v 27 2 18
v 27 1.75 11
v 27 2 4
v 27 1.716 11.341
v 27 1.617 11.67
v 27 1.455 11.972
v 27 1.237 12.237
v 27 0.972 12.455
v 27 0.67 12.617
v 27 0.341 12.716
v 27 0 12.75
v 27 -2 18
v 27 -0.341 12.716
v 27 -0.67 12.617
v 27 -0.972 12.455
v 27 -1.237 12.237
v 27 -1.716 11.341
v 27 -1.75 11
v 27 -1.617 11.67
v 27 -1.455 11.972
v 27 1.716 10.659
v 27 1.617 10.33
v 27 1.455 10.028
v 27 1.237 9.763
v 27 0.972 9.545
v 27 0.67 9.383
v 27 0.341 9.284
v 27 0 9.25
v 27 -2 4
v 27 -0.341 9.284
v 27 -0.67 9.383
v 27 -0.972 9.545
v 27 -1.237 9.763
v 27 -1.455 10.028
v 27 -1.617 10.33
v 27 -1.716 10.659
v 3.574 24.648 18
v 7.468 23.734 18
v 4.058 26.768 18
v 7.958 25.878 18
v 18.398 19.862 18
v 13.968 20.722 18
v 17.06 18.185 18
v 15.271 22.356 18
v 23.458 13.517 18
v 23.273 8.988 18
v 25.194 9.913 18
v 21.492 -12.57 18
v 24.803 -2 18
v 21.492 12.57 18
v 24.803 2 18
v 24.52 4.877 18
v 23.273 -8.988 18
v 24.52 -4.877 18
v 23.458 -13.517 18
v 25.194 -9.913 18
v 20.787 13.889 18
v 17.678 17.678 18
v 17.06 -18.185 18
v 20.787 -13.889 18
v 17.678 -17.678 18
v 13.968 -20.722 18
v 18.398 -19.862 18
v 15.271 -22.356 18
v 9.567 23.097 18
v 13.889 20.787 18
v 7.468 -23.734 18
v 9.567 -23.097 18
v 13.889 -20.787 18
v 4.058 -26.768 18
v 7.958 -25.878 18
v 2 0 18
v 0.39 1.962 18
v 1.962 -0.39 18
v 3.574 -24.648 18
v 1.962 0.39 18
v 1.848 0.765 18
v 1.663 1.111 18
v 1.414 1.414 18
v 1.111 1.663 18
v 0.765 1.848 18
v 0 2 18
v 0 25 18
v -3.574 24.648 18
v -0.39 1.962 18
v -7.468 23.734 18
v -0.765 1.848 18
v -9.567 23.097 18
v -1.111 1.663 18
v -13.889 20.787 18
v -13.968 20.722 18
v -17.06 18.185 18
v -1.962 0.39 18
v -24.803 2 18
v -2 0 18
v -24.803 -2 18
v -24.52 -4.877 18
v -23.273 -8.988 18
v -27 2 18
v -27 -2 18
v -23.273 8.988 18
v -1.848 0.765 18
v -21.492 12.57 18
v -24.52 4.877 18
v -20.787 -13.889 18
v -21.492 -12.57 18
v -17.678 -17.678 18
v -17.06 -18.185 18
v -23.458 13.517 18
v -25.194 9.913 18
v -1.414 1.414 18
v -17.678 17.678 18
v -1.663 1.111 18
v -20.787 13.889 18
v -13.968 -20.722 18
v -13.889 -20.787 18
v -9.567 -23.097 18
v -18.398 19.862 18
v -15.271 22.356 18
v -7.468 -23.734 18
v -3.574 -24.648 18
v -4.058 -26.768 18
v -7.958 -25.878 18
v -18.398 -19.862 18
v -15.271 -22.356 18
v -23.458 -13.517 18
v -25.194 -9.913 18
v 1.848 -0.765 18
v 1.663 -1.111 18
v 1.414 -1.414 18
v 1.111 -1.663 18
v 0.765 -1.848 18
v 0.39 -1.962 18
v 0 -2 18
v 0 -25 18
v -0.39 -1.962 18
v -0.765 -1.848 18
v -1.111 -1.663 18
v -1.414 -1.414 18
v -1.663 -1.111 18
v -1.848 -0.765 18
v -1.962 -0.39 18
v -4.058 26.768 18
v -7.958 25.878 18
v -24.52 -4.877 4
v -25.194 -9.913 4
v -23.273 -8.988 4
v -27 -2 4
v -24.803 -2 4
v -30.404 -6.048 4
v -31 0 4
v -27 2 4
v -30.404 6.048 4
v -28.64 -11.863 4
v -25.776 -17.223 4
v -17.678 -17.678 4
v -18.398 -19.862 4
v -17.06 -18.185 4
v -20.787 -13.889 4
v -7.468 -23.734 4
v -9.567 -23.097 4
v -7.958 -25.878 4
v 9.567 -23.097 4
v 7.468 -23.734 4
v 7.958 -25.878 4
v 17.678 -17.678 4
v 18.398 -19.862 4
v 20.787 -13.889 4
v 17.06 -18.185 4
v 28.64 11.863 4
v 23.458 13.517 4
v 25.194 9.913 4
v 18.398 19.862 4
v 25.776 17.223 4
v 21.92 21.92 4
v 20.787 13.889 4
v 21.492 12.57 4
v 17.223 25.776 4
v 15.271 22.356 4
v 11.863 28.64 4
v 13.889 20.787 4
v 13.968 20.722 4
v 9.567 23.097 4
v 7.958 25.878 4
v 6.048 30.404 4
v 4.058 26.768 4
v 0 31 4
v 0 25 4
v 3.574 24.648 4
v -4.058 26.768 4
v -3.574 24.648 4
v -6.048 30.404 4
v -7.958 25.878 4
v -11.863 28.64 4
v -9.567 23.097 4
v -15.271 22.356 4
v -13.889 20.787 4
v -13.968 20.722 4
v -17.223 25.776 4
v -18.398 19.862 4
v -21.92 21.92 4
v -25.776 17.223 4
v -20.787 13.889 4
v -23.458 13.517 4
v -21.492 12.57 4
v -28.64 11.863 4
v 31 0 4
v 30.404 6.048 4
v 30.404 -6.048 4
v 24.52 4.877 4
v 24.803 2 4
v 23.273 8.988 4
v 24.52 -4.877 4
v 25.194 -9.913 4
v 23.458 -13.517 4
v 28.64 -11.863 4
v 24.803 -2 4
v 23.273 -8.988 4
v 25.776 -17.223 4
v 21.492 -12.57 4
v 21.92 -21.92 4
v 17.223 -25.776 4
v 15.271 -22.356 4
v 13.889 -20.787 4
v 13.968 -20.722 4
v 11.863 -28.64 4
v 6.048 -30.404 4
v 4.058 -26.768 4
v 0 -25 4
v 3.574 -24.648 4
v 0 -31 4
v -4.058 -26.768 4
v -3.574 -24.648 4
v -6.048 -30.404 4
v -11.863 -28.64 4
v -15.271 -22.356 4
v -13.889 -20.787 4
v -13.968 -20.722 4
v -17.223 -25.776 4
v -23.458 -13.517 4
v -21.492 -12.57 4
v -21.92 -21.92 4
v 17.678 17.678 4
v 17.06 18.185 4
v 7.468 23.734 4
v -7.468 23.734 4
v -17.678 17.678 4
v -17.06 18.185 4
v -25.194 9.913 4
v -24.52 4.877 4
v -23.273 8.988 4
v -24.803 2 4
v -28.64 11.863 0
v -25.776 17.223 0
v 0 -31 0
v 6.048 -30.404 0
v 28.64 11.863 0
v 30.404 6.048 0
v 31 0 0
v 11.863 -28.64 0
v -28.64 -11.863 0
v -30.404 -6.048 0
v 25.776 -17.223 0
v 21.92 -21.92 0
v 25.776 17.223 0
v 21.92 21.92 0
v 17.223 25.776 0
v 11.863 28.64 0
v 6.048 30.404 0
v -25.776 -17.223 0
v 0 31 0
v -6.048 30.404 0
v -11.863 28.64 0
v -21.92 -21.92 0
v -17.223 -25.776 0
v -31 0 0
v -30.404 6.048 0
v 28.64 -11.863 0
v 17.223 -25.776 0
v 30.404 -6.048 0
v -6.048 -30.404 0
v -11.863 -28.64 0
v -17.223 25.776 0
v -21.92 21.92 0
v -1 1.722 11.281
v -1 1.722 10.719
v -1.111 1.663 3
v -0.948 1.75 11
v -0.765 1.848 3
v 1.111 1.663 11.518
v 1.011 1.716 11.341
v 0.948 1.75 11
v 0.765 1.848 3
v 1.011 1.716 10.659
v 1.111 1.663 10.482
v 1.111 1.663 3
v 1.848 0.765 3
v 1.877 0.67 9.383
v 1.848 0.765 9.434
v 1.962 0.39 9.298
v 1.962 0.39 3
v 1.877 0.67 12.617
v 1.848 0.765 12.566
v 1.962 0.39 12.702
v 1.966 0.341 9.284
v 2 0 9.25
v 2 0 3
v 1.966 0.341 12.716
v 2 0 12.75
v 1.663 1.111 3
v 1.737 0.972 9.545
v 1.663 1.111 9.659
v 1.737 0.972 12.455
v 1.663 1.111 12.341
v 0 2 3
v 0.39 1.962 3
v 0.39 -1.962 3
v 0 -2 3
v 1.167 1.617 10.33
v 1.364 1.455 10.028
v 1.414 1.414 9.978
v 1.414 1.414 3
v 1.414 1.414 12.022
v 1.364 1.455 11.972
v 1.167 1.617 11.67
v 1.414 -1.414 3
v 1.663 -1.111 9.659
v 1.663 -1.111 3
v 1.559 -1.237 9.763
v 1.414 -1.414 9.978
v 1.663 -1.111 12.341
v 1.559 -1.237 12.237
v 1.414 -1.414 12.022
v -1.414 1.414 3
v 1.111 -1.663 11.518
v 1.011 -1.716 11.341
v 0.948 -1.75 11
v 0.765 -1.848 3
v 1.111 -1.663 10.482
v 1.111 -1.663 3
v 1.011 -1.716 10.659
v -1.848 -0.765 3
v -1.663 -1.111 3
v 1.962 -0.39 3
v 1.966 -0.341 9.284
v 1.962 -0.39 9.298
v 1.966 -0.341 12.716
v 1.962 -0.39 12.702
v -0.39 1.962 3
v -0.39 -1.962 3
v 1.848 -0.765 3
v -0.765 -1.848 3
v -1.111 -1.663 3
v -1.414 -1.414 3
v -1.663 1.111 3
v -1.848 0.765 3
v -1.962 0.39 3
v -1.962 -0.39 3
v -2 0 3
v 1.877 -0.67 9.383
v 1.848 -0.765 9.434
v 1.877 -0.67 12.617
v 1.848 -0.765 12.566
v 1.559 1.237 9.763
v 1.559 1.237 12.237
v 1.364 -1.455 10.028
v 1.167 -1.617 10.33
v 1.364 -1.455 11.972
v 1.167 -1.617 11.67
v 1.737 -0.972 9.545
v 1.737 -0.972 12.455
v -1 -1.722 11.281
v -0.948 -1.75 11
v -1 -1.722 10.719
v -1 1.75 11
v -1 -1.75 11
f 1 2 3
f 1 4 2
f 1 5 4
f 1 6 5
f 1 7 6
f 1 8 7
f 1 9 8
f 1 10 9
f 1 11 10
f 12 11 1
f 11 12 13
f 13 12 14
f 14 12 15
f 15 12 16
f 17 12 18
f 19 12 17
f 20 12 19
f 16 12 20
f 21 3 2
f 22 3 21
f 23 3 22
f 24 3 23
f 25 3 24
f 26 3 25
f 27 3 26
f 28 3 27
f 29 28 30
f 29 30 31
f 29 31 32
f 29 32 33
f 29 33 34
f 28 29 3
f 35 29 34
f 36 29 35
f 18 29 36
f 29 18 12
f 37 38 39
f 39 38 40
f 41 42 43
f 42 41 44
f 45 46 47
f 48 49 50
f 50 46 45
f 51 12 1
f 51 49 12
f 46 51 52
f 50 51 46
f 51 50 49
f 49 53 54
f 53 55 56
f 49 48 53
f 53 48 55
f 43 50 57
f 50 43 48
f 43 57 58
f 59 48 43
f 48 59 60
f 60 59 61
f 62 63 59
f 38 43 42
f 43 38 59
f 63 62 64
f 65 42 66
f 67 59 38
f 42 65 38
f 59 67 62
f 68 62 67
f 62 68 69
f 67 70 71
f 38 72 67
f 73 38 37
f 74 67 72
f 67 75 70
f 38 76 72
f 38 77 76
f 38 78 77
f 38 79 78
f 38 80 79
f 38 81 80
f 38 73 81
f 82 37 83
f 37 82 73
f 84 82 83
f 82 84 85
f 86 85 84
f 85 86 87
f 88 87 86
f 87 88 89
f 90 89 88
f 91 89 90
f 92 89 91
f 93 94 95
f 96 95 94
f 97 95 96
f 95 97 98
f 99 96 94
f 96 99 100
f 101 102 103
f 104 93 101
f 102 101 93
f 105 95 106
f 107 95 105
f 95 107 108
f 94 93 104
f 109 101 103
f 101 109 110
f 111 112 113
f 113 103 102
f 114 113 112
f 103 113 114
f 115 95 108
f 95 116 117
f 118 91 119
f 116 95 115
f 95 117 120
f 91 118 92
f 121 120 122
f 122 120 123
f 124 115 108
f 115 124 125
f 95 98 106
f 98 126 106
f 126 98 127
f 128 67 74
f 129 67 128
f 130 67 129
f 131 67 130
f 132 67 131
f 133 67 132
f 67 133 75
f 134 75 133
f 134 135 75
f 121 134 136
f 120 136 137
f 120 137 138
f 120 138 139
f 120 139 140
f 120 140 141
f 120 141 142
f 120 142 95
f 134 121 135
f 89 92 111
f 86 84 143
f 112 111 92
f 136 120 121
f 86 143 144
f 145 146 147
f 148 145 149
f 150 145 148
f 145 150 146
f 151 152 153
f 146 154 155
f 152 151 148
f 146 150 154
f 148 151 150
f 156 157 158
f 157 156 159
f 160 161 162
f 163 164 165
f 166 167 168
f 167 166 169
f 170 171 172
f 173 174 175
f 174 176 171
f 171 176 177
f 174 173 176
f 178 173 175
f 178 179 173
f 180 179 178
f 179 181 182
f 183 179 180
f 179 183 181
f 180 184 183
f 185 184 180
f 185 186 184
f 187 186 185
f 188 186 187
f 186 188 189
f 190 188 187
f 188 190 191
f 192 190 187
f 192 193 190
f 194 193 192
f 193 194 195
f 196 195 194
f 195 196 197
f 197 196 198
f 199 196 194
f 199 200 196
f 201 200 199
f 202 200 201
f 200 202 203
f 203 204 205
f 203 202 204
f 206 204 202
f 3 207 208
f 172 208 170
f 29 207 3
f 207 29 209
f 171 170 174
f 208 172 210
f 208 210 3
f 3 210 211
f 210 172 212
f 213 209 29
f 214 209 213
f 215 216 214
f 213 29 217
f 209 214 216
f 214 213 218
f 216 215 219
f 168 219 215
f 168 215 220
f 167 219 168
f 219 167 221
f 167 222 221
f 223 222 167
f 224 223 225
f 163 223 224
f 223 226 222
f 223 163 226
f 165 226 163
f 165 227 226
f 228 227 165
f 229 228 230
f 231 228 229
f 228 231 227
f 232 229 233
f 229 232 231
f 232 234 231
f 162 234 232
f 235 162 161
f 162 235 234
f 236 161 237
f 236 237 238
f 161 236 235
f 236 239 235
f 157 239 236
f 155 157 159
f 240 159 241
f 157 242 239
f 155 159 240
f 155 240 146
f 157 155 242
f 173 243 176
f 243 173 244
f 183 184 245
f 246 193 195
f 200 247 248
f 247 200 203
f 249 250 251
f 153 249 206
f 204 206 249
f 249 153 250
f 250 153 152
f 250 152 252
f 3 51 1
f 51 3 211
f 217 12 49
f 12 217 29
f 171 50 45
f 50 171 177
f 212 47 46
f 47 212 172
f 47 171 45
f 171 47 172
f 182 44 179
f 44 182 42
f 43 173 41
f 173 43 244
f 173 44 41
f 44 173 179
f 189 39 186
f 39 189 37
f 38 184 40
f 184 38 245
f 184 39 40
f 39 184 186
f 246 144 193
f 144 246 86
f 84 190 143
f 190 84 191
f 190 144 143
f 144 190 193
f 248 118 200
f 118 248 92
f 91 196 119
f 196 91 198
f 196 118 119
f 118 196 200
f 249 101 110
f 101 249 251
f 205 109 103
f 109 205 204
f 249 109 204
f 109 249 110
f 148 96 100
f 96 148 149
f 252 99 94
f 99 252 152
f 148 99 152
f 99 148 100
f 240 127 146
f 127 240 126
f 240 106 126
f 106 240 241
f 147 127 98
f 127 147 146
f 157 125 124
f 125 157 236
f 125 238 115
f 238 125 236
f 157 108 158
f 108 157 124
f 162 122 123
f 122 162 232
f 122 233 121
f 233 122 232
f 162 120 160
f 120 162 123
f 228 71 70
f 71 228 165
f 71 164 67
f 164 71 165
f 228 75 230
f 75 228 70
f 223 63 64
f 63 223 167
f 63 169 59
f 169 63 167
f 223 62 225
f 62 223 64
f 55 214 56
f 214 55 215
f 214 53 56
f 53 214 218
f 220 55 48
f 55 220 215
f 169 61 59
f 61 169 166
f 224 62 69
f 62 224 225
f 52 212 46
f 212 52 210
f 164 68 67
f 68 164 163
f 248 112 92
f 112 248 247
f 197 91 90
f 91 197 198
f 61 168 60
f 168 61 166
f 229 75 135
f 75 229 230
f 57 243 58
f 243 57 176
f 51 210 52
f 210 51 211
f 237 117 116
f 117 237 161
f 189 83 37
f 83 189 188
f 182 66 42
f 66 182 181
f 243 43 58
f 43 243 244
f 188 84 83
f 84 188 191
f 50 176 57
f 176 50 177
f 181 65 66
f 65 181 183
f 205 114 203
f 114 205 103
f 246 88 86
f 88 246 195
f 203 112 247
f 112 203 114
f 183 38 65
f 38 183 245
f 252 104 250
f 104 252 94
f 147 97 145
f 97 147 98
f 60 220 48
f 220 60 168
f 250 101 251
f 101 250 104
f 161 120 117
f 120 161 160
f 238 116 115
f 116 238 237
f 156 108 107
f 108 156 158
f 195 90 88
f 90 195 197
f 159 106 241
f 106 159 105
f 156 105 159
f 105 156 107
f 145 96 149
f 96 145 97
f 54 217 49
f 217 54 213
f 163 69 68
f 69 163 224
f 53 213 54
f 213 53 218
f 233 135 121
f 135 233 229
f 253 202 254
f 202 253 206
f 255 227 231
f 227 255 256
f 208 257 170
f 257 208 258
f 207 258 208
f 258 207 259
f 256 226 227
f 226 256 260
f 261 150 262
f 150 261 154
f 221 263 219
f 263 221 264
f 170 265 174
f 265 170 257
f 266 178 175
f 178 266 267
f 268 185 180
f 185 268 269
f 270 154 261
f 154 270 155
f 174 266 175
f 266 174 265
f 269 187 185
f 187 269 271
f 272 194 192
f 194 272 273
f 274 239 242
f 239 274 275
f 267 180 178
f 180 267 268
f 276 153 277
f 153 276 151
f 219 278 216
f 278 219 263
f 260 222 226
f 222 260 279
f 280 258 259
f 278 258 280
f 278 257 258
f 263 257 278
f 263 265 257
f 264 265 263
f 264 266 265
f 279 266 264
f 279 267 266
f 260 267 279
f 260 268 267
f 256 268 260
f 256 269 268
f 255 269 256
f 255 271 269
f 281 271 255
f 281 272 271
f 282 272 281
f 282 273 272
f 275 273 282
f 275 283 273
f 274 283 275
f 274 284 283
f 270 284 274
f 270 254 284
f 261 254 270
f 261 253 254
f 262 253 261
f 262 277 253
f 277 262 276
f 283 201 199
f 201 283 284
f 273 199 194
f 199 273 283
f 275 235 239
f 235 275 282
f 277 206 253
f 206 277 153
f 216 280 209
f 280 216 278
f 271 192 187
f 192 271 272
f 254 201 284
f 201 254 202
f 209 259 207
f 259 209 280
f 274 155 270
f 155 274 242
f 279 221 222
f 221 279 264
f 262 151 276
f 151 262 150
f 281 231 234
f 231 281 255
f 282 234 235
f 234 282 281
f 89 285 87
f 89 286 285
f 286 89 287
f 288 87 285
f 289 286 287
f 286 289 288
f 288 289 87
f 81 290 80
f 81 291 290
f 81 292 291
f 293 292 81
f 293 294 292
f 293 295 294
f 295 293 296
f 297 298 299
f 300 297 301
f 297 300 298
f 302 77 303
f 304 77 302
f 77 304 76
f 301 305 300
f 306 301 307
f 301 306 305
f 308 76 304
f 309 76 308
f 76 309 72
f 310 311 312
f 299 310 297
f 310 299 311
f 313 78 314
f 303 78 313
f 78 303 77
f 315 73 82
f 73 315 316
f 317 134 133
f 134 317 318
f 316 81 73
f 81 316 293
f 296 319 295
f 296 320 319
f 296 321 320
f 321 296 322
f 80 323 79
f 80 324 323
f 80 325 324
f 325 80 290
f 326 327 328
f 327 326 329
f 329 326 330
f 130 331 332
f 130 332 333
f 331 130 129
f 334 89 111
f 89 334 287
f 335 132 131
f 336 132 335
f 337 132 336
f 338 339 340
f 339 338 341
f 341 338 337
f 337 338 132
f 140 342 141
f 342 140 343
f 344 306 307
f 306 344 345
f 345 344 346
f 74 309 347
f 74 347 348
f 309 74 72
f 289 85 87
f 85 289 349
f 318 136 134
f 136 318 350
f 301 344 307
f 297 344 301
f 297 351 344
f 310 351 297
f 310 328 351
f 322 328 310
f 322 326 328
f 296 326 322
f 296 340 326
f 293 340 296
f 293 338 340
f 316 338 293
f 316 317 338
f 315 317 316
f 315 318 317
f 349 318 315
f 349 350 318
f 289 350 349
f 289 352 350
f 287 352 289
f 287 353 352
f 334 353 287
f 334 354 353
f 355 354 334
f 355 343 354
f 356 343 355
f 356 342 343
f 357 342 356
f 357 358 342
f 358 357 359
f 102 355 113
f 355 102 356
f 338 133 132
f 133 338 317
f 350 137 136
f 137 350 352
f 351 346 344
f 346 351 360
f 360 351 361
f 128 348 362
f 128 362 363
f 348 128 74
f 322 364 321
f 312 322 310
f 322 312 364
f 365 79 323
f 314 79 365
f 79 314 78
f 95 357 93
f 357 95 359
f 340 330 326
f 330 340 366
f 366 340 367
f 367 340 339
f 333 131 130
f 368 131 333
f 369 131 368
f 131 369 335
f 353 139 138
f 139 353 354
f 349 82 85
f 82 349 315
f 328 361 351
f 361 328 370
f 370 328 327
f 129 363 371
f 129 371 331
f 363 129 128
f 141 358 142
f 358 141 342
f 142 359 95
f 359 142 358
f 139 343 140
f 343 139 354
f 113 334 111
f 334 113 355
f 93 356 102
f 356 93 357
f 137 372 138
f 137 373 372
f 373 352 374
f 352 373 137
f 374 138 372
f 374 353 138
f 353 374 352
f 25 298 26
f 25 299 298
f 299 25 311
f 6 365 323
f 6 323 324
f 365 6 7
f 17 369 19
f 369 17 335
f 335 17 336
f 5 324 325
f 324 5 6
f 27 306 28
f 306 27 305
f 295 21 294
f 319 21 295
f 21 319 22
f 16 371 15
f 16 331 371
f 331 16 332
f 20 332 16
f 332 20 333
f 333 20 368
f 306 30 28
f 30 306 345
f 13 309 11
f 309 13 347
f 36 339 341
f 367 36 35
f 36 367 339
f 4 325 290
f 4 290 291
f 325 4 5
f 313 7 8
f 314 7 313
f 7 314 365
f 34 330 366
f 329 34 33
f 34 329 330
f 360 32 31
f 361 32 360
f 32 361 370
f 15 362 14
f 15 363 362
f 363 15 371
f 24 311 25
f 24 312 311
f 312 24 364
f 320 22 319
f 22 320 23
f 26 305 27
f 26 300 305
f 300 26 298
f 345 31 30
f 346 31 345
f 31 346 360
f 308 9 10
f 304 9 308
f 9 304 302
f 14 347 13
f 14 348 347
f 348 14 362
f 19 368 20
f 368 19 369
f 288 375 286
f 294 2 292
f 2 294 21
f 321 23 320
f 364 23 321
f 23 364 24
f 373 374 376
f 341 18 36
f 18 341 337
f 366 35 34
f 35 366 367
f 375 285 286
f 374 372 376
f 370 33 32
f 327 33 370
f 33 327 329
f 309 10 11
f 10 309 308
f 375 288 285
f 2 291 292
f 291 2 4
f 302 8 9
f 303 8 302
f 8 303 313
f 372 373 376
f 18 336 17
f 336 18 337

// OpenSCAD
$fn = 32;

// ----------------------------------------------------------------------
// Control knob: skirt knob with grip ribs
// ----------------------------------------------------------------------

// --- parameters (mm) ---
skirt_d = 62;             // skirt diameter
skirt_t = 4;              // skirt thickness
rib_w = 4;                // grip rib width
rib_out = 3;              // grip rib radial protrusion
n_ribs = 14;              // number of grip ribs
knob_d = 50;              // knob body diameter
knob_h = 14;              // knob body height
bore_d = 4;               // shaft bore diameter
set_d = 3.5;              // set screw bore diameter

rib_step = 360 / n_ribs;  // rib angular step
total_h = skirt_t + knob_h;  // overall height

difference() {
  union() {
    translate([0, 0, skirt_t]) cylinder(h = knob_h, d = knob_d);
    cylinder(h = skirt_t, d = skirt_d);
    for (i = [0 : n_ribs - 1])
      rotate([0, 0, i * rib_step])
        translate([knob_d / 2 - 1, -rib_w / 2, skirt_t])
          cube([rib_out, rib_w, knob_h]);
  }
  translate([0, 0, skirt_t - 1]) cylinder(h = knob_h + 2, d = bore_d);
  translate([-1, 0, skirt_t + knob_h / 2]) rotate([0, 90, 0])
    cylinder(h = knob_d / 2 + bore_d / 2 + 2, d = set_d);
}
